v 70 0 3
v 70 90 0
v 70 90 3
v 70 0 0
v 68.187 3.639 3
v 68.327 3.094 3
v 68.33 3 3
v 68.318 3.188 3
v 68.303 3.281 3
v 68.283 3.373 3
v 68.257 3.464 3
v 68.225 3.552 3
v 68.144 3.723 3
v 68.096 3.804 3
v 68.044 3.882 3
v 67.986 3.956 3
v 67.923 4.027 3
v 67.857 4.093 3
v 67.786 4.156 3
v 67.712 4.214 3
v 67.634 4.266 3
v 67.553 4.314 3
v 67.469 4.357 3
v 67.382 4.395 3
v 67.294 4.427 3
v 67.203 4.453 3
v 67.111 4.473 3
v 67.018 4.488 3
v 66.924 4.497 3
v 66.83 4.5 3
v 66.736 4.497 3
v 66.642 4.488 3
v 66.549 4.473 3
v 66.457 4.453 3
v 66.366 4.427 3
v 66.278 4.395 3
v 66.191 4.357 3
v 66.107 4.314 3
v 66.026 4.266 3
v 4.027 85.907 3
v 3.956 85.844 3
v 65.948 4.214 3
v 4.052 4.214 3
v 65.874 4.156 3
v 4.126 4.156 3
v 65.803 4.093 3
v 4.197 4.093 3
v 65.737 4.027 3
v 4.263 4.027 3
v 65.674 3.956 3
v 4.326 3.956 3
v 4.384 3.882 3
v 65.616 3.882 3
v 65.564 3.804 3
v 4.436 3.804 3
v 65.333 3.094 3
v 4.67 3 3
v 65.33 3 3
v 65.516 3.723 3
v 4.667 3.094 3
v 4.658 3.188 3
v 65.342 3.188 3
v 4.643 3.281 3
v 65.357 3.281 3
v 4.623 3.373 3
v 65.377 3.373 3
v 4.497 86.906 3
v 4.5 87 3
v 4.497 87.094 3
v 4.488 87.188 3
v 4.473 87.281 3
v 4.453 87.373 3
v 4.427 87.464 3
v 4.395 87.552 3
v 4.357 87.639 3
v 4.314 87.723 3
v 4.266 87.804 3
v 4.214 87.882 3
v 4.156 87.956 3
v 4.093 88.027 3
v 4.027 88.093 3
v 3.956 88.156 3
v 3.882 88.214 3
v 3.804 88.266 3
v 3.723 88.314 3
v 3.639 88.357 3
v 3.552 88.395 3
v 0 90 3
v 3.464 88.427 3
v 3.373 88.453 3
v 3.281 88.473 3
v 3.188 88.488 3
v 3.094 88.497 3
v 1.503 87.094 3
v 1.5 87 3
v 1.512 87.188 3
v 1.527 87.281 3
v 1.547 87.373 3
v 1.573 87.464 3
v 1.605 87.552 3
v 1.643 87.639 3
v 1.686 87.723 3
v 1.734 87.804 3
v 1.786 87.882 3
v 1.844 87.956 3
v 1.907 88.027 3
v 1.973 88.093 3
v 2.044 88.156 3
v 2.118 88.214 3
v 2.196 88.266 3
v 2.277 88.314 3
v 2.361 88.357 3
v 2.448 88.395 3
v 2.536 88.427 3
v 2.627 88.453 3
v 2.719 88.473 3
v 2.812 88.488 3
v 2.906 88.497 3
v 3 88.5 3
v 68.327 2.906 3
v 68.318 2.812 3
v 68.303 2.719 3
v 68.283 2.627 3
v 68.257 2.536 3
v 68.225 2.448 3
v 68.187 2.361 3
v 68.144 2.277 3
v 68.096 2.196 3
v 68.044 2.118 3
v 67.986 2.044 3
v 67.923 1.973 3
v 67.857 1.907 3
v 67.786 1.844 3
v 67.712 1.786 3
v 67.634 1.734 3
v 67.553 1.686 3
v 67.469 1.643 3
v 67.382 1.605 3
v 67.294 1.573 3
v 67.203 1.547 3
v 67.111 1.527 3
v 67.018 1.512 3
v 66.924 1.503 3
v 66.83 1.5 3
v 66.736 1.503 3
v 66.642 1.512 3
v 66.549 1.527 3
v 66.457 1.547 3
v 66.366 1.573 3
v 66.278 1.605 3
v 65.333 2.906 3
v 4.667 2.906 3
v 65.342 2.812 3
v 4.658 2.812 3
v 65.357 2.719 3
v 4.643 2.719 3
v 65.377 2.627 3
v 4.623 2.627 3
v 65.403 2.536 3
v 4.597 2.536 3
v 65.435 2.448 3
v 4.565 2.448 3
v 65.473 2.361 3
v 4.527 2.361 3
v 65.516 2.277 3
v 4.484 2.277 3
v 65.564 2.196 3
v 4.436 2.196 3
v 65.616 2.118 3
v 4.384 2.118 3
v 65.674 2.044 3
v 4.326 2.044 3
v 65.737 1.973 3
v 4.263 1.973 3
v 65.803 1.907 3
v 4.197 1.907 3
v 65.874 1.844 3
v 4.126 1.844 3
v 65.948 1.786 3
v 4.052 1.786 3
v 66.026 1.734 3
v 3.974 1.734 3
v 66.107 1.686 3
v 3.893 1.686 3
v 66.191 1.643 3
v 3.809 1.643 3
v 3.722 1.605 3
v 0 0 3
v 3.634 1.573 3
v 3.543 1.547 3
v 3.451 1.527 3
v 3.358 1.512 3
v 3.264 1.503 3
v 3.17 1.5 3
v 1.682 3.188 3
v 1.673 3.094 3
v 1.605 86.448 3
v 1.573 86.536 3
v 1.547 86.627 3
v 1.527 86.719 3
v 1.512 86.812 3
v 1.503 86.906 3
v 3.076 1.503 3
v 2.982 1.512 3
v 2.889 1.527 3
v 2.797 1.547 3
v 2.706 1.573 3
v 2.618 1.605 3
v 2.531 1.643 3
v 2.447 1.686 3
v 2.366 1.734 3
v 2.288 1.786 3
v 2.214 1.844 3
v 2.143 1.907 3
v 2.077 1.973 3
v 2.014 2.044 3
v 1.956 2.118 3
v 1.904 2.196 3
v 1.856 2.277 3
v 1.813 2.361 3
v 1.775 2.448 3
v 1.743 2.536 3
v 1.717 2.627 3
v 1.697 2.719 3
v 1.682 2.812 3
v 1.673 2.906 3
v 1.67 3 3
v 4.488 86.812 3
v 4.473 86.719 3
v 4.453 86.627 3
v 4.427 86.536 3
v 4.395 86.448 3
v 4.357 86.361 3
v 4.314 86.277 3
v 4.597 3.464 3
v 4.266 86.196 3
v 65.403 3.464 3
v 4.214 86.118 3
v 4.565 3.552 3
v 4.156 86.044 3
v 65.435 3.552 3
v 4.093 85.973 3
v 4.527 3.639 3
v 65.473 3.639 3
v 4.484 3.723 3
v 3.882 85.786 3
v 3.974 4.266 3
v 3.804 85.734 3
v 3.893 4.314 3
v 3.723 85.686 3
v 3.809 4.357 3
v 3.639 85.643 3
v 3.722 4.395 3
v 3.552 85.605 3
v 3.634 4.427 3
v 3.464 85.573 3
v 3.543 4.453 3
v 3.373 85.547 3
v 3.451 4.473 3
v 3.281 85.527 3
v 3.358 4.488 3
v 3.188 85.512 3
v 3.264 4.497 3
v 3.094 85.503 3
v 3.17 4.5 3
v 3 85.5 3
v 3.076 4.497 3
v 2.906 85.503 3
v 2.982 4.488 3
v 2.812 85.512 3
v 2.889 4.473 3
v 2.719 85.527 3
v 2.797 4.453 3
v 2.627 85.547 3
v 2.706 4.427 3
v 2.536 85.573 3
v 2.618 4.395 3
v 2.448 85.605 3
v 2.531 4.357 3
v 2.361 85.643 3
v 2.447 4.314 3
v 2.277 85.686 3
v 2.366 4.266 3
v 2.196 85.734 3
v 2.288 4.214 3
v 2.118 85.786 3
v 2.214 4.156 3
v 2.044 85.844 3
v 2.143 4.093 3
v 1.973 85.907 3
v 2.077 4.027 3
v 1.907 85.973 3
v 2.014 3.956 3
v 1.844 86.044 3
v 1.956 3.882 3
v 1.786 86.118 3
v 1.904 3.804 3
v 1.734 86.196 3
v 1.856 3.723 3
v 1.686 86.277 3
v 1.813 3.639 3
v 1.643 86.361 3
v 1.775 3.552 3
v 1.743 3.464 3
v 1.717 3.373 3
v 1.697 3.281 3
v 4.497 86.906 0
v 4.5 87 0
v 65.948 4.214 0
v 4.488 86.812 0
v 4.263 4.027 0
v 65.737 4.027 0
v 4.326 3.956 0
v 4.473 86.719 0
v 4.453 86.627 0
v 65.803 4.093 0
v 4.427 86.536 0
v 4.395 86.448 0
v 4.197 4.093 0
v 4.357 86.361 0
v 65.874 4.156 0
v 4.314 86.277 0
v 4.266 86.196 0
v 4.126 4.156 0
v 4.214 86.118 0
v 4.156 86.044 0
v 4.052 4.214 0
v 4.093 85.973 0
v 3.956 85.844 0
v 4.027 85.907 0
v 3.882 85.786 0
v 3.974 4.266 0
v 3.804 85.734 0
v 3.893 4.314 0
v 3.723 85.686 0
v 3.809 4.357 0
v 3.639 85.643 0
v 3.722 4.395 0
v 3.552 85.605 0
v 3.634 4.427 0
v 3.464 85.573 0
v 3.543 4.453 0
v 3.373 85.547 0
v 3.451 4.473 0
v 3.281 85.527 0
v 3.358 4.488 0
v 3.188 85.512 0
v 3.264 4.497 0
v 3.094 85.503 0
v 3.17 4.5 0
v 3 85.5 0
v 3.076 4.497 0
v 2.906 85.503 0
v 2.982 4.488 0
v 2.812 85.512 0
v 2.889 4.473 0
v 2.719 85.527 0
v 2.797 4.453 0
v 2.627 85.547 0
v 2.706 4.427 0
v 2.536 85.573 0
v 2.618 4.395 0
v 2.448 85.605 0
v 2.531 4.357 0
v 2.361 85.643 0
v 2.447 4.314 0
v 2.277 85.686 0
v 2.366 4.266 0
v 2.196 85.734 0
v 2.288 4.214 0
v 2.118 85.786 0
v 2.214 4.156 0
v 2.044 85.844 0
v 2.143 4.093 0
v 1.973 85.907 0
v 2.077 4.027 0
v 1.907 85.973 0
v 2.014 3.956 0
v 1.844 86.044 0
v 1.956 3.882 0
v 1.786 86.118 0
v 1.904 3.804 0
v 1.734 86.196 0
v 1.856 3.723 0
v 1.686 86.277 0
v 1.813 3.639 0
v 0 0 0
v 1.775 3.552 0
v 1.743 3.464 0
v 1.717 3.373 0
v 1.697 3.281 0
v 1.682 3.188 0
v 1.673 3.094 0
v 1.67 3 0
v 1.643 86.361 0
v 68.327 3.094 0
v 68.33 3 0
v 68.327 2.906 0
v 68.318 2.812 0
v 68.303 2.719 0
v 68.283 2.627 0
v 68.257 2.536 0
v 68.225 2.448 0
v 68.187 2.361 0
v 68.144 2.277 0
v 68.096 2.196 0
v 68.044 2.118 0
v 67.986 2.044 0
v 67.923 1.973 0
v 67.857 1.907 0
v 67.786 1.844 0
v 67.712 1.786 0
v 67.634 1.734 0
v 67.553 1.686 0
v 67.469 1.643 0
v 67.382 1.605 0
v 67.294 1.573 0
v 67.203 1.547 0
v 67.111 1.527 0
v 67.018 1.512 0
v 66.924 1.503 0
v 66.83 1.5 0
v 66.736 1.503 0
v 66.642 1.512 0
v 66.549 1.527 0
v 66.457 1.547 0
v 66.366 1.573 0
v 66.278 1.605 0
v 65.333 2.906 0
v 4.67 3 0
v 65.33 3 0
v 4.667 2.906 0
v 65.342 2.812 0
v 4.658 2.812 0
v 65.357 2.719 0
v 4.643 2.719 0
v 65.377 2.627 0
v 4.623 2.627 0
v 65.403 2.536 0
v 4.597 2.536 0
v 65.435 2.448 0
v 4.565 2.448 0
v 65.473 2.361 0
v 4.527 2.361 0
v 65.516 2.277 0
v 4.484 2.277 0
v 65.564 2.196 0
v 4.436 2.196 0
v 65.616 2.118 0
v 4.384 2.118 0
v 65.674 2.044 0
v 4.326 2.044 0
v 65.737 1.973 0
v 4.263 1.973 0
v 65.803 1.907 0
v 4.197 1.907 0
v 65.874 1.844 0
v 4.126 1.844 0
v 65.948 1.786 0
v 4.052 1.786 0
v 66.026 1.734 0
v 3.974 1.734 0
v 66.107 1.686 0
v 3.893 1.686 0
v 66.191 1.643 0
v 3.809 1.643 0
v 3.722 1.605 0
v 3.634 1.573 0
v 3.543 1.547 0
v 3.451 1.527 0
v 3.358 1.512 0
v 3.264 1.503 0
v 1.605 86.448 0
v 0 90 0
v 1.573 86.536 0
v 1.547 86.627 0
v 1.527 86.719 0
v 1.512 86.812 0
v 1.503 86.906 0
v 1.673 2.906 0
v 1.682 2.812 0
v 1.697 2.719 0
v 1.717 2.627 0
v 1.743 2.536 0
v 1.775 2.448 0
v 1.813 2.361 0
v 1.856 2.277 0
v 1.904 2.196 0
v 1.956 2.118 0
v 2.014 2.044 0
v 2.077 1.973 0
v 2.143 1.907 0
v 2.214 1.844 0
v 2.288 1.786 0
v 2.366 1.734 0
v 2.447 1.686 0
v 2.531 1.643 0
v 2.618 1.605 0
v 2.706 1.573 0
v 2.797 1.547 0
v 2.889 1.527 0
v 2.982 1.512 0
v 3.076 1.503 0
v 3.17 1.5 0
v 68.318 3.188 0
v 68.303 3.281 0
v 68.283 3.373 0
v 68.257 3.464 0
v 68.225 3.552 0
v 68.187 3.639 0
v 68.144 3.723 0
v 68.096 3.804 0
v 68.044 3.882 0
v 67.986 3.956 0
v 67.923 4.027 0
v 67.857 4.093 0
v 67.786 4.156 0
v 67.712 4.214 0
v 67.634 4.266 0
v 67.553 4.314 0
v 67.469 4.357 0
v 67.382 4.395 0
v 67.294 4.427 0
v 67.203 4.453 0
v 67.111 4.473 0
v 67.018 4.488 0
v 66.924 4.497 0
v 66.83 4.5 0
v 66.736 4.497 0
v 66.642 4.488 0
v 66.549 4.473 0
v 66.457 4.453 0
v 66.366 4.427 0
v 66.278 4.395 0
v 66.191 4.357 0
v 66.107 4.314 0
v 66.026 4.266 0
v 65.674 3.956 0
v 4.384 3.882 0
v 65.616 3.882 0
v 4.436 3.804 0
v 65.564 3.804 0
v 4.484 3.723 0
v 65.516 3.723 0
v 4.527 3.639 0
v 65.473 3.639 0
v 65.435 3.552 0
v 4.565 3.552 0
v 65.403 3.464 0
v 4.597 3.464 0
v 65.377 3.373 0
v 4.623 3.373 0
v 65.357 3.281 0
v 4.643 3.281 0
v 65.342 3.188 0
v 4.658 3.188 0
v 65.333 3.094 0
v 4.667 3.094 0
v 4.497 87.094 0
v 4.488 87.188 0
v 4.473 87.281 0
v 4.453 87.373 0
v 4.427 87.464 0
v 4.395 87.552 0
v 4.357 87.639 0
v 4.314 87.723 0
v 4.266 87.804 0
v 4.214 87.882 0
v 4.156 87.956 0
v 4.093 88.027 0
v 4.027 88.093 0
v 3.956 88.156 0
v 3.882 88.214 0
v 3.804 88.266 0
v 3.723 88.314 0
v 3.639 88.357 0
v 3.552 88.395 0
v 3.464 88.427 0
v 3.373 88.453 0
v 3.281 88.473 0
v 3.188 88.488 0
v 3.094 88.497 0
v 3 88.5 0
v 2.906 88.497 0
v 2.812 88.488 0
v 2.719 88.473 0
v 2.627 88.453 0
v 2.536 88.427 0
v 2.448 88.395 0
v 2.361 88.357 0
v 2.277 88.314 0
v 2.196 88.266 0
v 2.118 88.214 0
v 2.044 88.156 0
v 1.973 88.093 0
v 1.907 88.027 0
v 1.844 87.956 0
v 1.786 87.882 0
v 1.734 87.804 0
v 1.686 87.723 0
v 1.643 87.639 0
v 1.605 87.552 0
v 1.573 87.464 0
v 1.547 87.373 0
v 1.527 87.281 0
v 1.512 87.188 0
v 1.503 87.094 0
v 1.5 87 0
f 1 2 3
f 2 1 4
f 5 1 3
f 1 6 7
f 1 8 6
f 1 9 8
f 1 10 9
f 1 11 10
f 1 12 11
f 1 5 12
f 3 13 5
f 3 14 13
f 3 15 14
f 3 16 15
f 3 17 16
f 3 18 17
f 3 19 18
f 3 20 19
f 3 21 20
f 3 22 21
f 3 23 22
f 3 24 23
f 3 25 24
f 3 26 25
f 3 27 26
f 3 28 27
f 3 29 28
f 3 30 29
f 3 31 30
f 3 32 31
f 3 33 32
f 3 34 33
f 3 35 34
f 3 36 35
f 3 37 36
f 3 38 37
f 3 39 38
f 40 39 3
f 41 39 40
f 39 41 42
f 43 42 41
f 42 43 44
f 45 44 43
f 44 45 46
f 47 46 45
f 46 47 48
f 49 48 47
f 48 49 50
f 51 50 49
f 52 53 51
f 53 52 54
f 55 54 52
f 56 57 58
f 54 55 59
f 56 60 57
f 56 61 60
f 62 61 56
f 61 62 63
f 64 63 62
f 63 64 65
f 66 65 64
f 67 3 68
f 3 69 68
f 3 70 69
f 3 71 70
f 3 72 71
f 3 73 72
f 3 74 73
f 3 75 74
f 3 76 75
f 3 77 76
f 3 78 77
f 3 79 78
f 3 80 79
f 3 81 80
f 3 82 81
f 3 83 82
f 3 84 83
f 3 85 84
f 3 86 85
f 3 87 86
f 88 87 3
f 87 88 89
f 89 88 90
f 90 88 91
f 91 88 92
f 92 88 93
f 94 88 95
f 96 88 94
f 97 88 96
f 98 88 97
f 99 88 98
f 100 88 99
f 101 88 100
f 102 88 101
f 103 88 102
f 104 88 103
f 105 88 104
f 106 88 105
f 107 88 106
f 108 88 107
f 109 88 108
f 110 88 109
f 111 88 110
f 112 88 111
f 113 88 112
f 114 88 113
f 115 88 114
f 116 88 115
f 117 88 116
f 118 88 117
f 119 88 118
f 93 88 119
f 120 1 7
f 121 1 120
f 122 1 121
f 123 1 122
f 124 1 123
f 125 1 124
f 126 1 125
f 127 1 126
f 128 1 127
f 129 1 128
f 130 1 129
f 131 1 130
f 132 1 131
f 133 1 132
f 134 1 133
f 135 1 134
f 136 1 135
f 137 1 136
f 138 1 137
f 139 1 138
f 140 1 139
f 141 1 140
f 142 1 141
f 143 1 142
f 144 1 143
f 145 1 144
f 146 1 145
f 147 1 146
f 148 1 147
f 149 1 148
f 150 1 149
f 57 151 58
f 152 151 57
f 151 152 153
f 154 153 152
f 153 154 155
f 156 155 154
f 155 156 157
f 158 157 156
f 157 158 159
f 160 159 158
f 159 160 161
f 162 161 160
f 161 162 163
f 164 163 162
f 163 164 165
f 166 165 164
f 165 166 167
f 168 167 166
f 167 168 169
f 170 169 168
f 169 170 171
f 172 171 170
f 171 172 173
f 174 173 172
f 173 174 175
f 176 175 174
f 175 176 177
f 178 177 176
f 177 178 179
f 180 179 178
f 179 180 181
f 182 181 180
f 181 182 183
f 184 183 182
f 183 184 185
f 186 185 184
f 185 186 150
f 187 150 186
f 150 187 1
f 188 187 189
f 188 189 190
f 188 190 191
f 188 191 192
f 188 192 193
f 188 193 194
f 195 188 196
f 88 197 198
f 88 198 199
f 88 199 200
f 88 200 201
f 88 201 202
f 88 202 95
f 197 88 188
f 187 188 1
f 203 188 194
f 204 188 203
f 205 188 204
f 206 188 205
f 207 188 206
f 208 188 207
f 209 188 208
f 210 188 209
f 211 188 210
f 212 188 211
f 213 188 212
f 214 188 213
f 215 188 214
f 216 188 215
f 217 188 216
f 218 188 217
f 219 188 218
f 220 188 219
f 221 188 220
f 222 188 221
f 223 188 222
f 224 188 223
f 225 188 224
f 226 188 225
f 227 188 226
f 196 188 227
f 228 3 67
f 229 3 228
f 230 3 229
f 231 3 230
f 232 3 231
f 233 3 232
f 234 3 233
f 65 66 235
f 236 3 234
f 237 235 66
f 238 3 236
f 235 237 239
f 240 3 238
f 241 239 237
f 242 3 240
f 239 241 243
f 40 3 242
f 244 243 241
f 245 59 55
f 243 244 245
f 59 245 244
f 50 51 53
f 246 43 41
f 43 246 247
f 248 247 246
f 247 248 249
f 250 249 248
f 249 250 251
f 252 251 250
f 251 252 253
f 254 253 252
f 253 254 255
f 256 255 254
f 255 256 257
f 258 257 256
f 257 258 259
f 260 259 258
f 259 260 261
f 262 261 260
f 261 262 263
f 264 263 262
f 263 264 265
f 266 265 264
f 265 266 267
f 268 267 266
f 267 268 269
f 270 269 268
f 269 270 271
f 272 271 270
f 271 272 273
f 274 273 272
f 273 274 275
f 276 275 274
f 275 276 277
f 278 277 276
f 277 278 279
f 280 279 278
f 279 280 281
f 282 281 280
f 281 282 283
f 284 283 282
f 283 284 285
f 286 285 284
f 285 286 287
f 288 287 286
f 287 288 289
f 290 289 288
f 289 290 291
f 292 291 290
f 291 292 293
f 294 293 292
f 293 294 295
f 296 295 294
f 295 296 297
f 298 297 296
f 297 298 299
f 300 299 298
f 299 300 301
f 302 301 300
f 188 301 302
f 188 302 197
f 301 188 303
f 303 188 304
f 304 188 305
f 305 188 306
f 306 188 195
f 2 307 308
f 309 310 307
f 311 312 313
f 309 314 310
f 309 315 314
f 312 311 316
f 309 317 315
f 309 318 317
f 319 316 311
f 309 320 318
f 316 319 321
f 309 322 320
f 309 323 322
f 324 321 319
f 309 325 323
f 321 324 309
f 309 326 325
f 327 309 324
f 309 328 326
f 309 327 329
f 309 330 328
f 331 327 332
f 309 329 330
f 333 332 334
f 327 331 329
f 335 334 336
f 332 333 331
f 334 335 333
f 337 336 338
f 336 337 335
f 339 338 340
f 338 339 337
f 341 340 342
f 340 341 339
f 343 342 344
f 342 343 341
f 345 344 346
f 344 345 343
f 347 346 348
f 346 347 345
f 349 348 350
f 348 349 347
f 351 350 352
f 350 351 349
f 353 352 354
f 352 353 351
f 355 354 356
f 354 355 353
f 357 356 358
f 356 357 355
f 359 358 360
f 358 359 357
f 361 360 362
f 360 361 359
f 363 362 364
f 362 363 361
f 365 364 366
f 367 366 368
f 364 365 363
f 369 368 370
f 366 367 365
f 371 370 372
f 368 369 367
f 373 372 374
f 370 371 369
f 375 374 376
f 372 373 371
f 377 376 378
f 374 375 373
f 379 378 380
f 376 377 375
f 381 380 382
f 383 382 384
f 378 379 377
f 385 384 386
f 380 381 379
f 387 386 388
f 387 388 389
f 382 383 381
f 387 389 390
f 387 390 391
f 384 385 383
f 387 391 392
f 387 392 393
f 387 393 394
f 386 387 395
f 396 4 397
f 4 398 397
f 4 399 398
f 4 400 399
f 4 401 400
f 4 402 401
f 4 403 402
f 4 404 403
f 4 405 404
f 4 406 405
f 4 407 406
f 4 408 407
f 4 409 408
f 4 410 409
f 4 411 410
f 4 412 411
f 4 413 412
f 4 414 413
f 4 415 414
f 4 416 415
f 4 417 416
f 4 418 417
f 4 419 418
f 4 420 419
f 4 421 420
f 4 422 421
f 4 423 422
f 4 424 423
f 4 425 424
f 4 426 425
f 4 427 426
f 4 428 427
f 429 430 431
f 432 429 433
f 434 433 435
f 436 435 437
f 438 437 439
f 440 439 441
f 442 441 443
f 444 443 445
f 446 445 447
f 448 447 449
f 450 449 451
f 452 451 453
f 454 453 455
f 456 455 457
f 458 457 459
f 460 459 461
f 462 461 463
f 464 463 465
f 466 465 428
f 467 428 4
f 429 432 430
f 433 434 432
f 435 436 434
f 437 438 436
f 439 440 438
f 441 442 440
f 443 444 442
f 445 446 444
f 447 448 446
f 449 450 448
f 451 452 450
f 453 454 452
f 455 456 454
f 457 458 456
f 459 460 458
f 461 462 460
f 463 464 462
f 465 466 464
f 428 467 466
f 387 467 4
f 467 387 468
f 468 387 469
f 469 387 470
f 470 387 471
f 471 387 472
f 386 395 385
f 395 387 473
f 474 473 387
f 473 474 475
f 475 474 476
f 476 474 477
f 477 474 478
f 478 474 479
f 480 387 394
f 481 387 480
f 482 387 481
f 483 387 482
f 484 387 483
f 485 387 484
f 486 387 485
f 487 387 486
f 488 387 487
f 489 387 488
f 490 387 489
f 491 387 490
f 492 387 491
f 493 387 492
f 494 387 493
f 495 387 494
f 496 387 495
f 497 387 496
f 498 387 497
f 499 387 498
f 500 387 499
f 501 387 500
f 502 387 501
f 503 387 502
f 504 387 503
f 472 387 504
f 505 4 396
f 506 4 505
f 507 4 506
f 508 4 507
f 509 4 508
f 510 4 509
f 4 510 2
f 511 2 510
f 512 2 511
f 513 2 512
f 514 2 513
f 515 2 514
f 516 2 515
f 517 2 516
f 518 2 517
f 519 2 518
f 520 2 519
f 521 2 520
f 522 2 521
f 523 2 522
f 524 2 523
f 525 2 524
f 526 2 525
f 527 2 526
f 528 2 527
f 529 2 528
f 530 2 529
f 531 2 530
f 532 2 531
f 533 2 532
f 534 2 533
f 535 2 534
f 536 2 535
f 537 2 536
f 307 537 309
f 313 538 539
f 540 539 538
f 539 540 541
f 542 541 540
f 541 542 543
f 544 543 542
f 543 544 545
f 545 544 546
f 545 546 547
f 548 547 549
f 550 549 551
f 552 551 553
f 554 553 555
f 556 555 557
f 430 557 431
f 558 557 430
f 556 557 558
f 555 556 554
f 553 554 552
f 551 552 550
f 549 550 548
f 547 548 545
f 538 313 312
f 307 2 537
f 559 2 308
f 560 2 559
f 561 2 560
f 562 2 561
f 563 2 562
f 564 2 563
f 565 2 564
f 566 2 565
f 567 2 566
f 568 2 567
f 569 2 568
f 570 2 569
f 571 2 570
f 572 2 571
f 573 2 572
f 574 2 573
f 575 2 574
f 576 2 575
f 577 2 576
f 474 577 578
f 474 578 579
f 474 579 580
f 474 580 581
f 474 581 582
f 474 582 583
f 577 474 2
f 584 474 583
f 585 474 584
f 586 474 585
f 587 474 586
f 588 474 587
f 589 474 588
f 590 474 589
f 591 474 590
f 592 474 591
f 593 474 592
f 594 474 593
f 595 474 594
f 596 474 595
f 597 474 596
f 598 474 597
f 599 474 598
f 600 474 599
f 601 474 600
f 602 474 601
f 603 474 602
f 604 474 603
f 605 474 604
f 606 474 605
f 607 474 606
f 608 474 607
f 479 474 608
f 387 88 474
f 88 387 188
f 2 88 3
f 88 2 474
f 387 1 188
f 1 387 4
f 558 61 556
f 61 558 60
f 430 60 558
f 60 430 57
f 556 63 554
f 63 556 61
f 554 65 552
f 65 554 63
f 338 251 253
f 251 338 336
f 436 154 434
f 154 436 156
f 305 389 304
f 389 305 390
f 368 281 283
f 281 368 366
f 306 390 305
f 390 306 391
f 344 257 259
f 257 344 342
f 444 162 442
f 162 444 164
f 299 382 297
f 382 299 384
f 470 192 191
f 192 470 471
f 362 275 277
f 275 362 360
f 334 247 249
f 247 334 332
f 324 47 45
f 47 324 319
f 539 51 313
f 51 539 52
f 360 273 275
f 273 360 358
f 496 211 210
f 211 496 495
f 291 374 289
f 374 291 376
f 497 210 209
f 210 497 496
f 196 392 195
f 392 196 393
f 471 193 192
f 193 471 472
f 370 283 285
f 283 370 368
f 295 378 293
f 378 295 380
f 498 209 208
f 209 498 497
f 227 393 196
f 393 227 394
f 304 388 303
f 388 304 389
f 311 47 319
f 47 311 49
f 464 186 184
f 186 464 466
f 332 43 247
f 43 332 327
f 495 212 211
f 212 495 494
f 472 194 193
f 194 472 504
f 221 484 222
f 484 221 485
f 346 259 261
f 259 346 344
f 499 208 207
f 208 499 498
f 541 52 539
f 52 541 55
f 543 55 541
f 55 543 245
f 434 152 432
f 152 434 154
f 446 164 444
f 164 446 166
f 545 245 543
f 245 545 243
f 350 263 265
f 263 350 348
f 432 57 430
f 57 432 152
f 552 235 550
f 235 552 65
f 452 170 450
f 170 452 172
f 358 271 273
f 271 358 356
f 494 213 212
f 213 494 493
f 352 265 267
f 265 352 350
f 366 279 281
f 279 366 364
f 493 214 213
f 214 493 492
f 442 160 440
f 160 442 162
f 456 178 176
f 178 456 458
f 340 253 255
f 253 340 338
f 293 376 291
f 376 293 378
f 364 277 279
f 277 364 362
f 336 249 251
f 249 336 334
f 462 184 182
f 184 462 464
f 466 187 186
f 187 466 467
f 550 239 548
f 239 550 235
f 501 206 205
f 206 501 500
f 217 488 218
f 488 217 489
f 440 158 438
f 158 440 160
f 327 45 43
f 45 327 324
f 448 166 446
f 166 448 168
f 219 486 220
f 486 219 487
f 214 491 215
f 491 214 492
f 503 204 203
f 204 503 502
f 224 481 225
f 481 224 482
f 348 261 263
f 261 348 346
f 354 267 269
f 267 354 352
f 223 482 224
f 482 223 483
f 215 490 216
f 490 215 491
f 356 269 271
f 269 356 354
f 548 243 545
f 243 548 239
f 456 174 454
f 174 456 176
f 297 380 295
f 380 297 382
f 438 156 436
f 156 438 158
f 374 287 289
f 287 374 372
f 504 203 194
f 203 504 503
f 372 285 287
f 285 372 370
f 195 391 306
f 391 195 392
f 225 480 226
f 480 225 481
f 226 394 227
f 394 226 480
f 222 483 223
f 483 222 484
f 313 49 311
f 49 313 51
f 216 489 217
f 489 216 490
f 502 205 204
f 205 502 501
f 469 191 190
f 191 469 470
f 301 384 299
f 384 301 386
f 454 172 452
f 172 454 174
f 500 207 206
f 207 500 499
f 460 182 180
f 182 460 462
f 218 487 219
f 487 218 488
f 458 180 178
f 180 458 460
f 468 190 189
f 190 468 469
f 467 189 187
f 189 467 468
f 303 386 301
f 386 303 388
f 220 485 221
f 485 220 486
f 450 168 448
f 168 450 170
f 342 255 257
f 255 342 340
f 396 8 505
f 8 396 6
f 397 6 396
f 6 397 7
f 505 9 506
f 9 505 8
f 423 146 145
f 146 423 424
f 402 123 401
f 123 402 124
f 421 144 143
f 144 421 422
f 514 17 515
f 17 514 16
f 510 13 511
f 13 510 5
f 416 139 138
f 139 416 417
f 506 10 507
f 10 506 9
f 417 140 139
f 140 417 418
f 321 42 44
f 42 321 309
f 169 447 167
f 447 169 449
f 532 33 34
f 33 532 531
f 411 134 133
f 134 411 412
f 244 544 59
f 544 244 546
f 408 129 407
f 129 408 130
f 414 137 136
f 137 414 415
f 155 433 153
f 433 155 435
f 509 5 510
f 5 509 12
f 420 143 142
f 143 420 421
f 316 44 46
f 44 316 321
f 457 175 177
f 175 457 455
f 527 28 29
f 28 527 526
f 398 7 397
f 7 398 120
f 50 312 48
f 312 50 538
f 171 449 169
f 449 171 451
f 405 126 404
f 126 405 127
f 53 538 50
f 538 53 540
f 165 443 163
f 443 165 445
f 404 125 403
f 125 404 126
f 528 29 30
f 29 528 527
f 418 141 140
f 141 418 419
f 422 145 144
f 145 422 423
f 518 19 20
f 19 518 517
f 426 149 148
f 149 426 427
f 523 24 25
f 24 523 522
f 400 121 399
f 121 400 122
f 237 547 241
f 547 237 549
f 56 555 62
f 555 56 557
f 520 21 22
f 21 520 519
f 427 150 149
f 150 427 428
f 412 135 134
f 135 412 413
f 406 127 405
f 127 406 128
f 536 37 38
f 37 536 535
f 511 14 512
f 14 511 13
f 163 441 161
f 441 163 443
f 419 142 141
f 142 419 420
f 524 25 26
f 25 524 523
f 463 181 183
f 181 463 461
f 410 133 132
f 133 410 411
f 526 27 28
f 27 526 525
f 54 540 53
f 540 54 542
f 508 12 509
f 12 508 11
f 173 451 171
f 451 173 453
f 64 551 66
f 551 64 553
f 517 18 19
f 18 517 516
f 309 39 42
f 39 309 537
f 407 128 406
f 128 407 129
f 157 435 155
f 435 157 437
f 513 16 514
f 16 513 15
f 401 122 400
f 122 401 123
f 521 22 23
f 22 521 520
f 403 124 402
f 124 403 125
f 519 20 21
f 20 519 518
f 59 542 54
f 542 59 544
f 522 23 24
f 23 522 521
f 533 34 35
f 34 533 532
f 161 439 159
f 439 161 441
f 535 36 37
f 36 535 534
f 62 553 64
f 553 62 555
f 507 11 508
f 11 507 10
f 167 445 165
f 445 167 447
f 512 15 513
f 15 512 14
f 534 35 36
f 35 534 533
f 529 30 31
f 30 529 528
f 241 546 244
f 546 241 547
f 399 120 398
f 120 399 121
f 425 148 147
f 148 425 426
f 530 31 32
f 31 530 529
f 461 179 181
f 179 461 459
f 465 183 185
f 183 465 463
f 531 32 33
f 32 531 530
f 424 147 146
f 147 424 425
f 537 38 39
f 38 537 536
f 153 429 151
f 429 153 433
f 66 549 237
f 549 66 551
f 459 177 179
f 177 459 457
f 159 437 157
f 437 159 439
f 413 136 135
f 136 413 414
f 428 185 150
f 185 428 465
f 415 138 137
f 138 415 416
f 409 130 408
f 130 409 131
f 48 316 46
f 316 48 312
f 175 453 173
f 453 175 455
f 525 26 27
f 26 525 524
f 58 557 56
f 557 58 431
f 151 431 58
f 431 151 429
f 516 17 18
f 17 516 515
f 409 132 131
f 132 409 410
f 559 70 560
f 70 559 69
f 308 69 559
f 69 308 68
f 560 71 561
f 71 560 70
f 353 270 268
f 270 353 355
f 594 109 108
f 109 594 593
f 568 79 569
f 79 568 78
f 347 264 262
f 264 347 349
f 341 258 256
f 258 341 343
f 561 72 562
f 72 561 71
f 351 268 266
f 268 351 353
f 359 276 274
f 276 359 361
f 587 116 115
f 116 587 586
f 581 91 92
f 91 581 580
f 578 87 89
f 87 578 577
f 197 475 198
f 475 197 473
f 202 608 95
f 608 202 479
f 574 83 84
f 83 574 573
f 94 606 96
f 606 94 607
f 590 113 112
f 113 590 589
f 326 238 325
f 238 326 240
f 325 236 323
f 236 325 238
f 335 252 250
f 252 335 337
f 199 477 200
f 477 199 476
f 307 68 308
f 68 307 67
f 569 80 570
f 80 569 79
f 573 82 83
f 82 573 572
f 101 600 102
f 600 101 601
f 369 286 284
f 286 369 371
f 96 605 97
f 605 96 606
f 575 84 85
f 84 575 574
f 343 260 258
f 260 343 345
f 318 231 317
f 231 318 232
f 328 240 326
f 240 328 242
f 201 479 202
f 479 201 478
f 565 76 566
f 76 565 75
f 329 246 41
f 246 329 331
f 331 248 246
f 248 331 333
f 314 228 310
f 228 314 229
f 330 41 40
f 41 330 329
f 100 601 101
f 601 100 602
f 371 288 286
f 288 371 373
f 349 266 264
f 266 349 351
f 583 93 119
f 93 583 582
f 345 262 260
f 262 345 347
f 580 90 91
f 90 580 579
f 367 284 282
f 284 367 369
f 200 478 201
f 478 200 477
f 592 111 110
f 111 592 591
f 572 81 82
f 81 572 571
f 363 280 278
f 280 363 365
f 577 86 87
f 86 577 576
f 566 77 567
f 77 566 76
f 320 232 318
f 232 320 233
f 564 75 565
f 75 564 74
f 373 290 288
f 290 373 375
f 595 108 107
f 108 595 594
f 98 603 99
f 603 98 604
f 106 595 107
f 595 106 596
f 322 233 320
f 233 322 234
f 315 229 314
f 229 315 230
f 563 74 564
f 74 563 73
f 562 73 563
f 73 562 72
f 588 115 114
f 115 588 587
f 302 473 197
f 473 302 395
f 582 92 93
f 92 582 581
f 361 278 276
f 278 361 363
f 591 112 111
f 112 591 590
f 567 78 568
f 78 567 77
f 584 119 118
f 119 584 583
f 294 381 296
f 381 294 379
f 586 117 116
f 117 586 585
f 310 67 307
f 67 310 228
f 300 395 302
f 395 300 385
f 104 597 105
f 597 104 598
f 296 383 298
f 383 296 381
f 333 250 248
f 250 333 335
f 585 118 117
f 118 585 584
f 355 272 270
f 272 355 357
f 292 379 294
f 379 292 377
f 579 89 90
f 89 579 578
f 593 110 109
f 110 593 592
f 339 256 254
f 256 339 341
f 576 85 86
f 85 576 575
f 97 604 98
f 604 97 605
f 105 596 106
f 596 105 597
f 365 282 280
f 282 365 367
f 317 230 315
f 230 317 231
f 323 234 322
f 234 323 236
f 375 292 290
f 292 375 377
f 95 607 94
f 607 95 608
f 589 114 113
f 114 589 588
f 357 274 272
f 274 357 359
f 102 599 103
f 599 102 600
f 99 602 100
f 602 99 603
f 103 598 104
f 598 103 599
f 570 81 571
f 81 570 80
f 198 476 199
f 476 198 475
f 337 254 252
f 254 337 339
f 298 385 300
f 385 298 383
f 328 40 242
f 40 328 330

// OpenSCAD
$fn=100;

screw_diam=3;

module pcb_hole_footprint(e){
     difference(){
	  cube([70,90,3]);
	  translate([screw_diam/2+1.67,screw_diam/2+1.5,-0.1])cylinder(d=screw_diam, h=e+0.2);
	  translate([70-(screw_diam/2+1.67),screw_diam/2+1.5,-0.1])cylinder(d=screw_diam, h=e+0.2);

	  translate([screw_diam/2+1.5,90-(screw_diam/2+1.5),-0.1])cylinder(d=screw_diam, h=e+0.2);
     }
}

pcb_hole_footprint(3);
